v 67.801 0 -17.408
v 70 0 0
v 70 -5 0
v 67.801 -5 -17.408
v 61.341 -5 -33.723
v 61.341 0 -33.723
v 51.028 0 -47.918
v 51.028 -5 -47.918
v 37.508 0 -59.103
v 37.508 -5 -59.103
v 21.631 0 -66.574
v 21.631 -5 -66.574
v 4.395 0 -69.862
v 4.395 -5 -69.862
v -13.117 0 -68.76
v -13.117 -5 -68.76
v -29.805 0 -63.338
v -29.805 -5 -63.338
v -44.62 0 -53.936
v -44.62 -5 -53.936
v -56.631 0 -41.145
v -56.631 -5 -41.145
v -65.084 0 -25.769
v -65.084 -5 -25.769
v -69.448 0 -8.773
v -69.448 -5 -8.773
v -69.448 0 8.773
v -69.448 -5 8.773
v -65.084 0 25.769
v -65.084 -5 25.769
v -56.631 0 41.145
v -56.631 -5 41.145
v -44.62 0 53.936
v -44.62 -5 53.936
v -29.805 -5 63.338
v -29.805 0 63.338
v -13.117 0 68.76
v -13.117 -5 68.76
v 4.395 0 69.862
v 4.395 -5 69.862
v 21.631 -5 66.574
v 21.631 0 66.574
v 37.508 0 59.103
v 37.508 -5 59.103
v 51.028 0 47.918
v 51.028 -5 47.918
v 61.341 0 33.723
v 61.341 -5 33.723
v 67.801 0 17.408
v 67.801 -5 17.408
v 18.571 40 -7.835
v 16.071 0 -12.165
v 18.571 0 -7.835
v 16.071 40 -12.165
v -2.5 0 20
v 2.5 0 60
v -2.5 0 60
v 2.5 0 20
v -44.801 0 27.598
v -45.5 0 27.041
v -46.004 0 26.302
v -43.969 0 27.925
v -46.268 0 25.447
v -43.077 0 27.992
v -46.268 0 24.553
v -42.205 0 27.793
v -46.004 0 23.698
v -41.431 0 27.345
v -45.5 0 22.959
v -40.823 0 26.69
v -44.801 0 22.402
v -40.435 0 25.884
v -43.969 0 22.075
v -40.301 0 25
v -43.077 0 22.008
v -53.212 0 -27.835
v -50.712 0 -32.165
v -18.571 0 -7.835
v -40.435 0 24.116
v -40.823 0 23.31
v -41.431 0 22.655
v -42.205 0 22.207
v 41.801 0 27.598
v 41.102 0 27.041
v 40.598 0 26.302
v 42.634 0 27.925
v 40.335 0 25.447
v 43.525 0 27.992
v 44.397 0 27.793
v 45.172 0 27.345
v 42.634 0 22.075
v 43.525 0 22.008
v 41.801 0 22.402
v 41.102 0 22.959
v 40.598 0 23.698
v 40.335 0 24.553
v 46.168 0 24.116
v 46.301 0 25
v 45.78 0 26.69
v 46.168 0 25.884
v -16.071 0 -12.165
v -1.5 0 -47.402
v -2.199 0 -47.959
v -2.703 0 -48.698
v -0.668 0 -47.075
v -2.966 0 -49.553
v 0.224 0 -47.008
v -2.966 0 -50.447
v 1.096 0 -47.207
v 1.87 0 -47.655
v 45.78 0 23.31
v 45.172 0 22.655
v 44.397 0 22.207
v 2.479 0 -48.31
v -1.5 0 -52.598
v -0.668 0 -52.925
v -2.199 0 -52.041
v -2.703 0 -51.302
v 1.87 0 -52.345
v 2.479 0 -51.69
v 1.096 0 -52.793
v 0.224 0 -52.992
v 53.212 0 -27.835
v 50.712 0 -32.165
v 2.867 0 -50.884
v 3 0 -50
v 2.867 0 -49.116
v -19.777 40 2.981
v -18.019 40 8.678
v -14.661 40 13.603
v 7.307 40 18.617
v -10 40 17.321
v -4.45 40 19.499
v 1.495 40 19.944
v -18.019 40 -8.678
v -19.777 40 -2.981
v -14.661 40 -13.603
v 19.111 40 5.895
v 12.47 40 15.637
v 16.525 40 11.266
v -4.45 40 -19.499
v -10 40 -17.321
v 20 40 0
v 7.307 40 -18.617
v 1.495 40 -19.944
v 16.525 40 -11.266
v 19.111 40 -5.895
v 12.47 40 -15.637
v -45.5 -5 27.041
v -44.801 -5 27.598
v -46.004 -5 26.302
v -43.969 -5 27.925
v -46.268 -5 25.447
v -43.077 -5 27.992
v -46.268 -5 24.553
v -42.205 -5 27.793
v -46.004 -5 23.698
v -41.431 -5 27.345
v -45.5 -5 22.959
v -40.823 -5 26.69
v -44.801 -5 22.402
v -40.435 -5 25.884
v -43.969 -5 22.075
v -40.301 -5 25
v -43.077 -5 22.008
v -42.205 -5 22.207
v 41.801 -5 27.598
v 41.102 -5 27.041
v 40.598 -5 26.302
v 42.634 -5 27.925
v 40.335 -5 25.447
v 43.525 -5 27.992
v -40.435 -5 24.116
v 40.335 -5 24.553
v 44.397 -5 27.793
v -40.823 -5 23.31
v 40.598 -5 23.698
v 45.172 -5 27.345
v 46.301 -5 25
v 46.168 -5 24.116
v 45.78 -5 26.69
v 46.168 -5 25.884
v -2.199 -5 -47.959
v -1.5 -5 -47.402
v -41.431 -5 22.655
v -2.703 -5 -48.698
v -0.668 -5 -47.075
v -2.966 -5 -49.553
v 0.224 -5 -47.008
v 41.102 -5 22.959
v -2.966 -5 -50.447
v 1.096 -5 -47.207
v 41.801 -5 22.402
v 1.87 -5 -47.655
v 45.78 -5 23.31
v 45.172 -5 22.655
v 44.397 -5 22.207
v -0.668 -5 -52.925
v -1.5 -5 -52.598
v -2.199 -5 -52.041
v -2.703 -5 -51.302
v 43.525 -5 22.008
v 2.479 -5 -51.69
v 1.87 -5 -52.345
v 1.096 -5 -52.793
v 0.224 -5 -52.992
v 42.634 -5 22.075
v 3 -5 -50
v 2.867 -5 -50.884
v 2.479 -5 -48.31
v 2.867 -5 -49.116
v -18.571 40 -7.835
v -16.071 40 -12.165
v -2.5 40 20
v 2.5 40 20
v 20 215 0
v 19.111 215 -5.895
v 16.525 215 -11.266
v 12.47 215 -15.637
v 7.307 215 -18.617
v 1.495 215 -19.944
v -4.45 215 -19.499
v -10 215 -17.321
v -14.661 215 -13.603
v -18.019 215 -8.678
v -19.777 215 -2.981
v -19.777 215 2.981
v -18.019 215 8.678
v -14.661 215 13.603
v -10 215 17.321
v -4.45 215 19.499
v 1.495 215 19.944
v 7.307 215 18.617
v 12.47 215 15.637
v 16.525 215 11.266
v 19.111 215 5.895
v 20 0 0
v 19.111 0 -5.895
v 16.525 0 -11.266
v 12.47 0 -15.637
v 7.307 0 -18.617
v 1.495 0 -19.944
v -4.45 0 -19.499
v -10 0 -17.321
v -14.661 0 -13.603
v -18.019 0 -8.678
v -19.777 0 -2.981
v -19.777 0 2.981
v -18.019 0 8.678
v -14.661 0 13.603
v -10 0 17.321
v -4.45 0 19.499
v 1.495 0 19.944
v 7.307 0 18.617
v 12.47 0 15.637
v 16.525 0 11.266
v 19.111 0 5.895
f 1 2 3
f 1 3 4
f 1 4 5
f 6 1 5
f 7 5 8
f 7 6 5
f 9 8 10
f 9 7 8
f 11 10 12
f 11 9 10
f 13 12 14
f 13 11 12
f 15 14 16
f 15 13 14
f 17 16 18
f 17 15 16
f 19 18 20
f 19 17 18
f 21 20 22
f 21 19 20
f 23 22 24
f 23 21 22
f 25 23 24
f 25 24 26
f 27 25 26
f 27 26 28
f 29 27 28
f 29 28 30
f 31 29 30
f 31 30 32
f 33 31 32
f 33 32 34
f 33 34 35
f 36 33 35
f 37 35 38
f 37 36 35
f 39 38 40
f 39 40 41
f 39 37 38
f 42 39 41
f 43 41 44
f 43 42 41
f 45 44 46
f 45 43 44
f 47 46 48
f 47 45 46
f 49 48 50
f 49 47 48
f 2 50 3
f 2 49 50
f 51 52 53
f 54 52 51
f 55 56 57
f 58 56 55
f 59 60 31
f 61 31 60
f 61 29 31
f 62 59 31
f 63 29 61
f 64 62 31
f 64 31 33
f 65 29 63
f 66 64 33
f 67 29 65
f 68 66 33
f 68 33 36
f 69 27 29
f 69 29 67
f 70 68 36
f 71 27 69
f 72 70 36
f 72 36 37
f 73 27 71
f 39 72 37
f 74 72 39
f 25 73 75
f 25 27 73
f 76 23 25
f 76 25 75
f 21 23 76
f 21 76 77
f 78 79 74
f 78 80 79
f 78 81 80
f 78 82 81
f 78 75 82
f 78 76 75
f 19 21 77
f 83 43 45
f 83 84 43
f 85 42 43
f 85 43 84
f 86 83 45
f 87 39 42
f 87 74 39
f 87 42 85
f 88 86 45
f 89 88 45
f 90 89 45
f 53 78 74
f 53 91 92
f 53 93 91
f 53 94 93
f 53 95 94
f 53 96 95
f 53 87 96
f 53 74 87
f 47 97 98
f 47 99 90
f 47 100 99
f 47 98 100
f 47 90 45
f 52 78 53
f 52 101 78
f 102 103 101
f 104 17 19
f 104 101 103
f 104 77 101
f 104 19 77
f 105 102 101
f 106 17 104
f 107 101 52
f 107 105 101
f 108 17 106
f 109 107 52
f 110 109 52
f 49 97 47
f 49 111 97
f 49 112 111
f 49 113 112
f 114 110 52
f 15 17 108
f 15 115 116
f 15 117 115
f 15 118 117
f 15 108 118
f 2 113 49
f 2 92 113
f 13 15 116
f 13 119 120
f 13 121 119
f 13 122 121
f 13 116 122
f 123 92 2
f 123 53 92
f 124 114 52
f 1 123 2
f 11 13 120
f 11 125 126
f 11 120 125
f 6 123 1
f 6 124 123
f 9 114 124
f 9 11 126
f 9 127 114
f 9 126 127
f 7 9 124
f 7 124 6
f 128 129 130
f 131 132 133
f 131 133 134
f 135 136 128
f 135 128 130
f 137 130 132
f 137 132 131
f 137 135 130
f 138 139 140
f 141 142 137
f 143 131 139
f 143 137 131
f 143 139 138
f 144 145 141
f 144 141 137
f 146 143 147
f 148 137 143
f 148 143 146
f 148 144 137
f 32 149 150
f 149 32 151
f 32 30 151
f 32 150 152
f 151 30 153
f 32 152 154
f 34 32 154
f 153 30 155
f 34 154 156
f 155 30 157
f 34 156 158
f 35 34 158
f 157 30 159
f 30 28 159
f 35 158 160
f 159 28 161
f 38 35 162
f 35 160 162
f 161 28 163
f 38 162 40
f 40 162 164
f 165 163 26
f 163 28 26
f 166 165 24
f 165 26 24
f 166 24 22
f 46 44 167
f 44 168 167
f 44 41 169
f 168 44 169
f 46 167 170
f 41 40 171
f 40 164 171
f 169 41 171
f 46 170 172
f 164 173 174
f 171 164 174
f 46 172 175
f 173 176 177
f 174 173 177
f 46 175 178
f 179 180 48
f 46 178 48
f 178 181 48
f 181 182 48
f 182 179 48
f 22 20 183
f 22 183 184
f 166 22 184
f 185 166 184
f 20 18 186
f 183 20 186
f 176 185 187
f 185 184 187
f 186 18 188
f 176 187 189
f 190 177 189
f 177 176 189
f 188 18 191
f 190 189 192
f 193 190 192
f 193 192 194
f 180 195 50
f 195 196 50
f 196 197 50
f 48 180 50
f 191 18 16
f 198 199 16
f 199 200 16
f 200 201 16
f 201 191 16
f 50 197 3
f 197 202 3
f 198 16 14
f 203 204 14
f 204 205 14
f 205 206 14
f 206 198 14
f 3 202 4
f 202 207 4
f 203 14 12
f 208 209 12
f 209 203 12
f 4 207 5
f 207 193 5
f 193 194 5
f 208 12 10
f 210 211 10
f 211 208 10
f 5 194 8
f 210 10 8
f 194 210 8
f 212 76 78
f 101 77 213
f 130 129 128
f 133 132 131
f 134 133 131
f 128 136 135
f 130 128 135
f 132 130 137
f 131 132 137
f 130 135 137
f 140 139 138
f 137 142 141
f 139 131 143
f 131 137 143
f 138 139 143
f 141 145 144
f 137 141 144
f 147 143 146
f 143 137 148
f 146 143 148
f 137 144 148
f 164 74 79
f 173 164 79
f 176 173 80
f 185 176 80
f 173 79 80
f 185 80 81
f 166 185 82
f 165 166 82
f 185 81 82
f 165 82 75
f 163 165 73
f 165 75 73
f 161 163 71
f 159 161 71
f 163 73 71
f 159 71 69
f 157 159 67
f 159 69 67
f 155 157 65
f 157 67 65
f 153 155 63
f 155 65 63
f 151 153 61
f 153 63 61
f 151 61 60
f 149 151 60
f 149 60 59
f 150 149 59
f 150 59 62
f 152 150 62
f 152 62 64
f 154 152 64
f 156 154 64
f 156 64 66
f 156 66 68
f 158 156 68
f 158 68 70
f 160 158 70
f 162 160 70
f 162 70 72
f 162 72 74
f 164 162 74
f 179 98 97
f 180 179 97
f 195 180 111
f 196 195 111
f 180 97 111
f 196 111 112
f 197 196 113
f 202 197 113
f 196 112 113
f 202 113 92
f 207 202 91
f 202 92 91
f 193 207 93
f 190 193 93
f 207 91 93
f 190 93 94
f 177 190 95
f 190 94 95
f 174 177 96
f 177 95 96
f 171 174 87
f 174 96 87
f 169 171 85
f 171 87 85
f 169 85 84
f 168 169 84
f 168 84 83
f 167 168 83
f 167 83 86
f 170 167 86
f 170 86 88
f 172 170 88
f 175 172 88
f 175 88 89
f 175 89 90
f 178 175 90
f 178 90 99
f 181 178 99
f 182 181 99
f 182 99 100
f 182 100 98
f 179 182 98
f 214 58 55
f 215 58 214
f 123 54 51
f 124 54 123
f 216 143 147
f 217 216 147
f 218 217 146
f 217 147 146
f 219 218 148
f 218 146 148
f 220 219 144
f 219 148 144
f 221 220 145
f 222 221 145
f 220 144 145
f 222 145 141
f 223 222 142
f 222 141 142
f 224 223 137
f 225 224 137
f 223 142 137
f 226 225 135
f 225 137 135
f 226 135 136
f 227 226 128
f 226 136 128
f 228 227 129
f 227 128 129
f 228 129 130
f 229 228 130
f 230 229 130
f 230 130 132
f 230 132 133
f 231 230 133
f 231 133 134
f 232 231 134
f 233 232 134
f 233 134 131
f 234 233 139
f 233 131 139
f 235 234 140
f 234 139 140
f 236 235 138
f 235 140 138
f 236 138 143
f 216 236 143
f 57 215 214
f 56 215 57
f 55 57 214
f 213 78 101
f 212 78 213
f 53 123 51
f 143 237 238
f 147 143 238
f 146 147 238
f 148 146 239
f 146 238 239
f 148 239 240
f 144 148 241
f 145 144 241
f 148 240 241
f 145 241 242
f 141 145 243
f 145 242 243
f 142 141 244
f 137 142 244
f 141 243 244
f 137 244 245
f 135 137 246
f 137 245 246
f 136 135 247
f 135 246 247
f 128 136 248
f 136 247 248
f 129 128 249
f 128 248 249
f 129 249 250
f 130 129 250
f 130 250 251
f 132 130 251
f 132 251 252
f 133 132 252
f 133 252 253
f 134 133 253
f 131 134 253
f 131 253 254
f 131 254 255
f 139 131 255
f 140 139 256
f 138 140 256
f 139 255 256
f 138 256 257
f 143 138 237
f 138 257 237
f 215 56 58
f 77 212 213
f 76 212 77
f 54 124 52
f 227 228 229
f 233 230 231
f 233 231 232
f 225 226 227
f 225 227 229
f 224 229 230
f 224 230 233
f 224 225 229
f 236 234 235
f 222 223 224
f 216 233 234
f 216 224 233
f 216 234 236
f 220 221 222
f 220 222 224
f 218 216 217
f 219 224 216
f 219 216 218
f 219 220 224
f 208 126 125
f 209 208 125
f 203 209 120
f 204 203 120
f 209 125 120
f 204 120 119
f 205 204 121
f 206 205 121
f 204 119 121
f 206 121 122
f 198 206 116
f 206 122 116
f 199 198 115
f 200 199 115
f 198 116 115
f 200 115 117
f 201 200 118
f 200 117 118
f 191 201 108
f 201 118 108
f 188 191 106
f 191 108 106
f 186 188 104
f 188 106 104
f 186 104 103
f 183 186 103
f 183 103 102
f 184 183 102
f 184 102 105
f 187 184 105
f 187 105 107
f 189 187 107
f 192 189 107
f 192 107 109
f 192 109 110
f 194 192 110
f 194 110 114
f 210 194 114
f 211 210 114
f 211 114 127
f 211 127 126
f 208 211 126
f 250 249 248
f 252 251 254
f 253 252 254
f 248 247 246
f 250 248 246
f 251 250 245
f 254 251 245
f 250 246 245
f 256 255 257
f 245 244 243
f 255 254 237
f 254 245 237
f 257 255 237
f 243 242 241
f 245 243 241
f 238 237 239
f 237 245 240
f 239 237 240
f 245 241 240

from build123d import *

# Parameters (mm, degrees)
SKETCH1_R           = 70
BOSS_EXTRUDE1_DEPTH = 5
SKETCH2_R           = 20
BOSS_EXTRUDE2_DEPTH = 40
SKETCH3_R           = 20
BOSS_EXTRUDE3_DEPTH = 175
BOSS_EXTRUDE4_DEPTH = 2.5
CIRPATTERN1_COUNT   = 3
SKETCH5_R           = 3
CUT_EXTRUDE1_DEPTH  = 237.696007571


with BuildPart() as part:
    # Sketch1 → Boss-Extrude1 (new body)
    with BuildSketch(Plane(origin=(0, 0, 0), x_dir=(1, 0, 0), z_dir=(0, 1, 0))):
        Circle(SKETCH1_R)
    extrude(amount=-BOSS_EXTRUDE1_DEPTH)


with BuildPart() as body_2:
    # Sketch2 → Boss-Extrude2 (new body)
    with BuildSketch(Plane(origin=(0, 0, 0), x_dir=(1, 0, 0), z_dir=(0, 1, 0))):
        Circle(SKETCH2_R)
    extrude(amount=BOSS_EXTRUDE2_DEPTH)


with BuildPart() as body_3:
    # Sketch3 → Boss-Extrude3 (new body)
    with BuildSketch(Plane(origin=(0, 40, 0), x_dir=(1, 0, 0), z_dir=(0, 1, 0))):
        Circle(SKETCH3_R)
    extrude(amount=BOSS_EXTRUDE3_DEPTH)


with BuildPart() as body_4:
    # Sketch4 → Boss-Extrude4 (new, symmetric)
    with BuildSketch(Plane(origin=(0, 0, 0), x_dir=(0, 0, -1), z_dir=(1, 0, 0))):
        Polygon((-60, 0), (-20, 0), (-20, 40), align=None)
    boss_extrude4 = extrude(amount=BOSS_EXTRUDE4_DEPTH, both=True)


with BuildPart() as part_1:
    add(part.part)

    # CirPattern1: Boss-Extrude4 ×3 about axis
    cirpattern1_axis = Axis((0, 40, 0), (0, -1, 0))
    for i in range(1, CIRPATTERN1_COUNT):
        add(boss_extrude4.rotate(cirpattern1_axis, i * 360 / CIRPATTERN1_COUNT))

    # Sketch5 → Cut-Extrude1 (cut, through all)
    with BuildSketch(Plane(origin=(0, 0, 0), x_dir=(1, 0, 0), z_dir=(0, 1, 0))):
        with Locations((0, 50)):
            Circle(SKETCH5_R)
        with Locations((43.301270189, -25)):
            Circle(SKETCH5_R)
        with Locations((-43.301270189, -25)):
            Circle(SKETCH5_R)
    extrude(amount=-CUT_EXTRUDE1_DEPTH, mode=Mode.SUBTRACT)


solid = Compound([body_2.part, body_3.part, body_4.part, part_1.part])
